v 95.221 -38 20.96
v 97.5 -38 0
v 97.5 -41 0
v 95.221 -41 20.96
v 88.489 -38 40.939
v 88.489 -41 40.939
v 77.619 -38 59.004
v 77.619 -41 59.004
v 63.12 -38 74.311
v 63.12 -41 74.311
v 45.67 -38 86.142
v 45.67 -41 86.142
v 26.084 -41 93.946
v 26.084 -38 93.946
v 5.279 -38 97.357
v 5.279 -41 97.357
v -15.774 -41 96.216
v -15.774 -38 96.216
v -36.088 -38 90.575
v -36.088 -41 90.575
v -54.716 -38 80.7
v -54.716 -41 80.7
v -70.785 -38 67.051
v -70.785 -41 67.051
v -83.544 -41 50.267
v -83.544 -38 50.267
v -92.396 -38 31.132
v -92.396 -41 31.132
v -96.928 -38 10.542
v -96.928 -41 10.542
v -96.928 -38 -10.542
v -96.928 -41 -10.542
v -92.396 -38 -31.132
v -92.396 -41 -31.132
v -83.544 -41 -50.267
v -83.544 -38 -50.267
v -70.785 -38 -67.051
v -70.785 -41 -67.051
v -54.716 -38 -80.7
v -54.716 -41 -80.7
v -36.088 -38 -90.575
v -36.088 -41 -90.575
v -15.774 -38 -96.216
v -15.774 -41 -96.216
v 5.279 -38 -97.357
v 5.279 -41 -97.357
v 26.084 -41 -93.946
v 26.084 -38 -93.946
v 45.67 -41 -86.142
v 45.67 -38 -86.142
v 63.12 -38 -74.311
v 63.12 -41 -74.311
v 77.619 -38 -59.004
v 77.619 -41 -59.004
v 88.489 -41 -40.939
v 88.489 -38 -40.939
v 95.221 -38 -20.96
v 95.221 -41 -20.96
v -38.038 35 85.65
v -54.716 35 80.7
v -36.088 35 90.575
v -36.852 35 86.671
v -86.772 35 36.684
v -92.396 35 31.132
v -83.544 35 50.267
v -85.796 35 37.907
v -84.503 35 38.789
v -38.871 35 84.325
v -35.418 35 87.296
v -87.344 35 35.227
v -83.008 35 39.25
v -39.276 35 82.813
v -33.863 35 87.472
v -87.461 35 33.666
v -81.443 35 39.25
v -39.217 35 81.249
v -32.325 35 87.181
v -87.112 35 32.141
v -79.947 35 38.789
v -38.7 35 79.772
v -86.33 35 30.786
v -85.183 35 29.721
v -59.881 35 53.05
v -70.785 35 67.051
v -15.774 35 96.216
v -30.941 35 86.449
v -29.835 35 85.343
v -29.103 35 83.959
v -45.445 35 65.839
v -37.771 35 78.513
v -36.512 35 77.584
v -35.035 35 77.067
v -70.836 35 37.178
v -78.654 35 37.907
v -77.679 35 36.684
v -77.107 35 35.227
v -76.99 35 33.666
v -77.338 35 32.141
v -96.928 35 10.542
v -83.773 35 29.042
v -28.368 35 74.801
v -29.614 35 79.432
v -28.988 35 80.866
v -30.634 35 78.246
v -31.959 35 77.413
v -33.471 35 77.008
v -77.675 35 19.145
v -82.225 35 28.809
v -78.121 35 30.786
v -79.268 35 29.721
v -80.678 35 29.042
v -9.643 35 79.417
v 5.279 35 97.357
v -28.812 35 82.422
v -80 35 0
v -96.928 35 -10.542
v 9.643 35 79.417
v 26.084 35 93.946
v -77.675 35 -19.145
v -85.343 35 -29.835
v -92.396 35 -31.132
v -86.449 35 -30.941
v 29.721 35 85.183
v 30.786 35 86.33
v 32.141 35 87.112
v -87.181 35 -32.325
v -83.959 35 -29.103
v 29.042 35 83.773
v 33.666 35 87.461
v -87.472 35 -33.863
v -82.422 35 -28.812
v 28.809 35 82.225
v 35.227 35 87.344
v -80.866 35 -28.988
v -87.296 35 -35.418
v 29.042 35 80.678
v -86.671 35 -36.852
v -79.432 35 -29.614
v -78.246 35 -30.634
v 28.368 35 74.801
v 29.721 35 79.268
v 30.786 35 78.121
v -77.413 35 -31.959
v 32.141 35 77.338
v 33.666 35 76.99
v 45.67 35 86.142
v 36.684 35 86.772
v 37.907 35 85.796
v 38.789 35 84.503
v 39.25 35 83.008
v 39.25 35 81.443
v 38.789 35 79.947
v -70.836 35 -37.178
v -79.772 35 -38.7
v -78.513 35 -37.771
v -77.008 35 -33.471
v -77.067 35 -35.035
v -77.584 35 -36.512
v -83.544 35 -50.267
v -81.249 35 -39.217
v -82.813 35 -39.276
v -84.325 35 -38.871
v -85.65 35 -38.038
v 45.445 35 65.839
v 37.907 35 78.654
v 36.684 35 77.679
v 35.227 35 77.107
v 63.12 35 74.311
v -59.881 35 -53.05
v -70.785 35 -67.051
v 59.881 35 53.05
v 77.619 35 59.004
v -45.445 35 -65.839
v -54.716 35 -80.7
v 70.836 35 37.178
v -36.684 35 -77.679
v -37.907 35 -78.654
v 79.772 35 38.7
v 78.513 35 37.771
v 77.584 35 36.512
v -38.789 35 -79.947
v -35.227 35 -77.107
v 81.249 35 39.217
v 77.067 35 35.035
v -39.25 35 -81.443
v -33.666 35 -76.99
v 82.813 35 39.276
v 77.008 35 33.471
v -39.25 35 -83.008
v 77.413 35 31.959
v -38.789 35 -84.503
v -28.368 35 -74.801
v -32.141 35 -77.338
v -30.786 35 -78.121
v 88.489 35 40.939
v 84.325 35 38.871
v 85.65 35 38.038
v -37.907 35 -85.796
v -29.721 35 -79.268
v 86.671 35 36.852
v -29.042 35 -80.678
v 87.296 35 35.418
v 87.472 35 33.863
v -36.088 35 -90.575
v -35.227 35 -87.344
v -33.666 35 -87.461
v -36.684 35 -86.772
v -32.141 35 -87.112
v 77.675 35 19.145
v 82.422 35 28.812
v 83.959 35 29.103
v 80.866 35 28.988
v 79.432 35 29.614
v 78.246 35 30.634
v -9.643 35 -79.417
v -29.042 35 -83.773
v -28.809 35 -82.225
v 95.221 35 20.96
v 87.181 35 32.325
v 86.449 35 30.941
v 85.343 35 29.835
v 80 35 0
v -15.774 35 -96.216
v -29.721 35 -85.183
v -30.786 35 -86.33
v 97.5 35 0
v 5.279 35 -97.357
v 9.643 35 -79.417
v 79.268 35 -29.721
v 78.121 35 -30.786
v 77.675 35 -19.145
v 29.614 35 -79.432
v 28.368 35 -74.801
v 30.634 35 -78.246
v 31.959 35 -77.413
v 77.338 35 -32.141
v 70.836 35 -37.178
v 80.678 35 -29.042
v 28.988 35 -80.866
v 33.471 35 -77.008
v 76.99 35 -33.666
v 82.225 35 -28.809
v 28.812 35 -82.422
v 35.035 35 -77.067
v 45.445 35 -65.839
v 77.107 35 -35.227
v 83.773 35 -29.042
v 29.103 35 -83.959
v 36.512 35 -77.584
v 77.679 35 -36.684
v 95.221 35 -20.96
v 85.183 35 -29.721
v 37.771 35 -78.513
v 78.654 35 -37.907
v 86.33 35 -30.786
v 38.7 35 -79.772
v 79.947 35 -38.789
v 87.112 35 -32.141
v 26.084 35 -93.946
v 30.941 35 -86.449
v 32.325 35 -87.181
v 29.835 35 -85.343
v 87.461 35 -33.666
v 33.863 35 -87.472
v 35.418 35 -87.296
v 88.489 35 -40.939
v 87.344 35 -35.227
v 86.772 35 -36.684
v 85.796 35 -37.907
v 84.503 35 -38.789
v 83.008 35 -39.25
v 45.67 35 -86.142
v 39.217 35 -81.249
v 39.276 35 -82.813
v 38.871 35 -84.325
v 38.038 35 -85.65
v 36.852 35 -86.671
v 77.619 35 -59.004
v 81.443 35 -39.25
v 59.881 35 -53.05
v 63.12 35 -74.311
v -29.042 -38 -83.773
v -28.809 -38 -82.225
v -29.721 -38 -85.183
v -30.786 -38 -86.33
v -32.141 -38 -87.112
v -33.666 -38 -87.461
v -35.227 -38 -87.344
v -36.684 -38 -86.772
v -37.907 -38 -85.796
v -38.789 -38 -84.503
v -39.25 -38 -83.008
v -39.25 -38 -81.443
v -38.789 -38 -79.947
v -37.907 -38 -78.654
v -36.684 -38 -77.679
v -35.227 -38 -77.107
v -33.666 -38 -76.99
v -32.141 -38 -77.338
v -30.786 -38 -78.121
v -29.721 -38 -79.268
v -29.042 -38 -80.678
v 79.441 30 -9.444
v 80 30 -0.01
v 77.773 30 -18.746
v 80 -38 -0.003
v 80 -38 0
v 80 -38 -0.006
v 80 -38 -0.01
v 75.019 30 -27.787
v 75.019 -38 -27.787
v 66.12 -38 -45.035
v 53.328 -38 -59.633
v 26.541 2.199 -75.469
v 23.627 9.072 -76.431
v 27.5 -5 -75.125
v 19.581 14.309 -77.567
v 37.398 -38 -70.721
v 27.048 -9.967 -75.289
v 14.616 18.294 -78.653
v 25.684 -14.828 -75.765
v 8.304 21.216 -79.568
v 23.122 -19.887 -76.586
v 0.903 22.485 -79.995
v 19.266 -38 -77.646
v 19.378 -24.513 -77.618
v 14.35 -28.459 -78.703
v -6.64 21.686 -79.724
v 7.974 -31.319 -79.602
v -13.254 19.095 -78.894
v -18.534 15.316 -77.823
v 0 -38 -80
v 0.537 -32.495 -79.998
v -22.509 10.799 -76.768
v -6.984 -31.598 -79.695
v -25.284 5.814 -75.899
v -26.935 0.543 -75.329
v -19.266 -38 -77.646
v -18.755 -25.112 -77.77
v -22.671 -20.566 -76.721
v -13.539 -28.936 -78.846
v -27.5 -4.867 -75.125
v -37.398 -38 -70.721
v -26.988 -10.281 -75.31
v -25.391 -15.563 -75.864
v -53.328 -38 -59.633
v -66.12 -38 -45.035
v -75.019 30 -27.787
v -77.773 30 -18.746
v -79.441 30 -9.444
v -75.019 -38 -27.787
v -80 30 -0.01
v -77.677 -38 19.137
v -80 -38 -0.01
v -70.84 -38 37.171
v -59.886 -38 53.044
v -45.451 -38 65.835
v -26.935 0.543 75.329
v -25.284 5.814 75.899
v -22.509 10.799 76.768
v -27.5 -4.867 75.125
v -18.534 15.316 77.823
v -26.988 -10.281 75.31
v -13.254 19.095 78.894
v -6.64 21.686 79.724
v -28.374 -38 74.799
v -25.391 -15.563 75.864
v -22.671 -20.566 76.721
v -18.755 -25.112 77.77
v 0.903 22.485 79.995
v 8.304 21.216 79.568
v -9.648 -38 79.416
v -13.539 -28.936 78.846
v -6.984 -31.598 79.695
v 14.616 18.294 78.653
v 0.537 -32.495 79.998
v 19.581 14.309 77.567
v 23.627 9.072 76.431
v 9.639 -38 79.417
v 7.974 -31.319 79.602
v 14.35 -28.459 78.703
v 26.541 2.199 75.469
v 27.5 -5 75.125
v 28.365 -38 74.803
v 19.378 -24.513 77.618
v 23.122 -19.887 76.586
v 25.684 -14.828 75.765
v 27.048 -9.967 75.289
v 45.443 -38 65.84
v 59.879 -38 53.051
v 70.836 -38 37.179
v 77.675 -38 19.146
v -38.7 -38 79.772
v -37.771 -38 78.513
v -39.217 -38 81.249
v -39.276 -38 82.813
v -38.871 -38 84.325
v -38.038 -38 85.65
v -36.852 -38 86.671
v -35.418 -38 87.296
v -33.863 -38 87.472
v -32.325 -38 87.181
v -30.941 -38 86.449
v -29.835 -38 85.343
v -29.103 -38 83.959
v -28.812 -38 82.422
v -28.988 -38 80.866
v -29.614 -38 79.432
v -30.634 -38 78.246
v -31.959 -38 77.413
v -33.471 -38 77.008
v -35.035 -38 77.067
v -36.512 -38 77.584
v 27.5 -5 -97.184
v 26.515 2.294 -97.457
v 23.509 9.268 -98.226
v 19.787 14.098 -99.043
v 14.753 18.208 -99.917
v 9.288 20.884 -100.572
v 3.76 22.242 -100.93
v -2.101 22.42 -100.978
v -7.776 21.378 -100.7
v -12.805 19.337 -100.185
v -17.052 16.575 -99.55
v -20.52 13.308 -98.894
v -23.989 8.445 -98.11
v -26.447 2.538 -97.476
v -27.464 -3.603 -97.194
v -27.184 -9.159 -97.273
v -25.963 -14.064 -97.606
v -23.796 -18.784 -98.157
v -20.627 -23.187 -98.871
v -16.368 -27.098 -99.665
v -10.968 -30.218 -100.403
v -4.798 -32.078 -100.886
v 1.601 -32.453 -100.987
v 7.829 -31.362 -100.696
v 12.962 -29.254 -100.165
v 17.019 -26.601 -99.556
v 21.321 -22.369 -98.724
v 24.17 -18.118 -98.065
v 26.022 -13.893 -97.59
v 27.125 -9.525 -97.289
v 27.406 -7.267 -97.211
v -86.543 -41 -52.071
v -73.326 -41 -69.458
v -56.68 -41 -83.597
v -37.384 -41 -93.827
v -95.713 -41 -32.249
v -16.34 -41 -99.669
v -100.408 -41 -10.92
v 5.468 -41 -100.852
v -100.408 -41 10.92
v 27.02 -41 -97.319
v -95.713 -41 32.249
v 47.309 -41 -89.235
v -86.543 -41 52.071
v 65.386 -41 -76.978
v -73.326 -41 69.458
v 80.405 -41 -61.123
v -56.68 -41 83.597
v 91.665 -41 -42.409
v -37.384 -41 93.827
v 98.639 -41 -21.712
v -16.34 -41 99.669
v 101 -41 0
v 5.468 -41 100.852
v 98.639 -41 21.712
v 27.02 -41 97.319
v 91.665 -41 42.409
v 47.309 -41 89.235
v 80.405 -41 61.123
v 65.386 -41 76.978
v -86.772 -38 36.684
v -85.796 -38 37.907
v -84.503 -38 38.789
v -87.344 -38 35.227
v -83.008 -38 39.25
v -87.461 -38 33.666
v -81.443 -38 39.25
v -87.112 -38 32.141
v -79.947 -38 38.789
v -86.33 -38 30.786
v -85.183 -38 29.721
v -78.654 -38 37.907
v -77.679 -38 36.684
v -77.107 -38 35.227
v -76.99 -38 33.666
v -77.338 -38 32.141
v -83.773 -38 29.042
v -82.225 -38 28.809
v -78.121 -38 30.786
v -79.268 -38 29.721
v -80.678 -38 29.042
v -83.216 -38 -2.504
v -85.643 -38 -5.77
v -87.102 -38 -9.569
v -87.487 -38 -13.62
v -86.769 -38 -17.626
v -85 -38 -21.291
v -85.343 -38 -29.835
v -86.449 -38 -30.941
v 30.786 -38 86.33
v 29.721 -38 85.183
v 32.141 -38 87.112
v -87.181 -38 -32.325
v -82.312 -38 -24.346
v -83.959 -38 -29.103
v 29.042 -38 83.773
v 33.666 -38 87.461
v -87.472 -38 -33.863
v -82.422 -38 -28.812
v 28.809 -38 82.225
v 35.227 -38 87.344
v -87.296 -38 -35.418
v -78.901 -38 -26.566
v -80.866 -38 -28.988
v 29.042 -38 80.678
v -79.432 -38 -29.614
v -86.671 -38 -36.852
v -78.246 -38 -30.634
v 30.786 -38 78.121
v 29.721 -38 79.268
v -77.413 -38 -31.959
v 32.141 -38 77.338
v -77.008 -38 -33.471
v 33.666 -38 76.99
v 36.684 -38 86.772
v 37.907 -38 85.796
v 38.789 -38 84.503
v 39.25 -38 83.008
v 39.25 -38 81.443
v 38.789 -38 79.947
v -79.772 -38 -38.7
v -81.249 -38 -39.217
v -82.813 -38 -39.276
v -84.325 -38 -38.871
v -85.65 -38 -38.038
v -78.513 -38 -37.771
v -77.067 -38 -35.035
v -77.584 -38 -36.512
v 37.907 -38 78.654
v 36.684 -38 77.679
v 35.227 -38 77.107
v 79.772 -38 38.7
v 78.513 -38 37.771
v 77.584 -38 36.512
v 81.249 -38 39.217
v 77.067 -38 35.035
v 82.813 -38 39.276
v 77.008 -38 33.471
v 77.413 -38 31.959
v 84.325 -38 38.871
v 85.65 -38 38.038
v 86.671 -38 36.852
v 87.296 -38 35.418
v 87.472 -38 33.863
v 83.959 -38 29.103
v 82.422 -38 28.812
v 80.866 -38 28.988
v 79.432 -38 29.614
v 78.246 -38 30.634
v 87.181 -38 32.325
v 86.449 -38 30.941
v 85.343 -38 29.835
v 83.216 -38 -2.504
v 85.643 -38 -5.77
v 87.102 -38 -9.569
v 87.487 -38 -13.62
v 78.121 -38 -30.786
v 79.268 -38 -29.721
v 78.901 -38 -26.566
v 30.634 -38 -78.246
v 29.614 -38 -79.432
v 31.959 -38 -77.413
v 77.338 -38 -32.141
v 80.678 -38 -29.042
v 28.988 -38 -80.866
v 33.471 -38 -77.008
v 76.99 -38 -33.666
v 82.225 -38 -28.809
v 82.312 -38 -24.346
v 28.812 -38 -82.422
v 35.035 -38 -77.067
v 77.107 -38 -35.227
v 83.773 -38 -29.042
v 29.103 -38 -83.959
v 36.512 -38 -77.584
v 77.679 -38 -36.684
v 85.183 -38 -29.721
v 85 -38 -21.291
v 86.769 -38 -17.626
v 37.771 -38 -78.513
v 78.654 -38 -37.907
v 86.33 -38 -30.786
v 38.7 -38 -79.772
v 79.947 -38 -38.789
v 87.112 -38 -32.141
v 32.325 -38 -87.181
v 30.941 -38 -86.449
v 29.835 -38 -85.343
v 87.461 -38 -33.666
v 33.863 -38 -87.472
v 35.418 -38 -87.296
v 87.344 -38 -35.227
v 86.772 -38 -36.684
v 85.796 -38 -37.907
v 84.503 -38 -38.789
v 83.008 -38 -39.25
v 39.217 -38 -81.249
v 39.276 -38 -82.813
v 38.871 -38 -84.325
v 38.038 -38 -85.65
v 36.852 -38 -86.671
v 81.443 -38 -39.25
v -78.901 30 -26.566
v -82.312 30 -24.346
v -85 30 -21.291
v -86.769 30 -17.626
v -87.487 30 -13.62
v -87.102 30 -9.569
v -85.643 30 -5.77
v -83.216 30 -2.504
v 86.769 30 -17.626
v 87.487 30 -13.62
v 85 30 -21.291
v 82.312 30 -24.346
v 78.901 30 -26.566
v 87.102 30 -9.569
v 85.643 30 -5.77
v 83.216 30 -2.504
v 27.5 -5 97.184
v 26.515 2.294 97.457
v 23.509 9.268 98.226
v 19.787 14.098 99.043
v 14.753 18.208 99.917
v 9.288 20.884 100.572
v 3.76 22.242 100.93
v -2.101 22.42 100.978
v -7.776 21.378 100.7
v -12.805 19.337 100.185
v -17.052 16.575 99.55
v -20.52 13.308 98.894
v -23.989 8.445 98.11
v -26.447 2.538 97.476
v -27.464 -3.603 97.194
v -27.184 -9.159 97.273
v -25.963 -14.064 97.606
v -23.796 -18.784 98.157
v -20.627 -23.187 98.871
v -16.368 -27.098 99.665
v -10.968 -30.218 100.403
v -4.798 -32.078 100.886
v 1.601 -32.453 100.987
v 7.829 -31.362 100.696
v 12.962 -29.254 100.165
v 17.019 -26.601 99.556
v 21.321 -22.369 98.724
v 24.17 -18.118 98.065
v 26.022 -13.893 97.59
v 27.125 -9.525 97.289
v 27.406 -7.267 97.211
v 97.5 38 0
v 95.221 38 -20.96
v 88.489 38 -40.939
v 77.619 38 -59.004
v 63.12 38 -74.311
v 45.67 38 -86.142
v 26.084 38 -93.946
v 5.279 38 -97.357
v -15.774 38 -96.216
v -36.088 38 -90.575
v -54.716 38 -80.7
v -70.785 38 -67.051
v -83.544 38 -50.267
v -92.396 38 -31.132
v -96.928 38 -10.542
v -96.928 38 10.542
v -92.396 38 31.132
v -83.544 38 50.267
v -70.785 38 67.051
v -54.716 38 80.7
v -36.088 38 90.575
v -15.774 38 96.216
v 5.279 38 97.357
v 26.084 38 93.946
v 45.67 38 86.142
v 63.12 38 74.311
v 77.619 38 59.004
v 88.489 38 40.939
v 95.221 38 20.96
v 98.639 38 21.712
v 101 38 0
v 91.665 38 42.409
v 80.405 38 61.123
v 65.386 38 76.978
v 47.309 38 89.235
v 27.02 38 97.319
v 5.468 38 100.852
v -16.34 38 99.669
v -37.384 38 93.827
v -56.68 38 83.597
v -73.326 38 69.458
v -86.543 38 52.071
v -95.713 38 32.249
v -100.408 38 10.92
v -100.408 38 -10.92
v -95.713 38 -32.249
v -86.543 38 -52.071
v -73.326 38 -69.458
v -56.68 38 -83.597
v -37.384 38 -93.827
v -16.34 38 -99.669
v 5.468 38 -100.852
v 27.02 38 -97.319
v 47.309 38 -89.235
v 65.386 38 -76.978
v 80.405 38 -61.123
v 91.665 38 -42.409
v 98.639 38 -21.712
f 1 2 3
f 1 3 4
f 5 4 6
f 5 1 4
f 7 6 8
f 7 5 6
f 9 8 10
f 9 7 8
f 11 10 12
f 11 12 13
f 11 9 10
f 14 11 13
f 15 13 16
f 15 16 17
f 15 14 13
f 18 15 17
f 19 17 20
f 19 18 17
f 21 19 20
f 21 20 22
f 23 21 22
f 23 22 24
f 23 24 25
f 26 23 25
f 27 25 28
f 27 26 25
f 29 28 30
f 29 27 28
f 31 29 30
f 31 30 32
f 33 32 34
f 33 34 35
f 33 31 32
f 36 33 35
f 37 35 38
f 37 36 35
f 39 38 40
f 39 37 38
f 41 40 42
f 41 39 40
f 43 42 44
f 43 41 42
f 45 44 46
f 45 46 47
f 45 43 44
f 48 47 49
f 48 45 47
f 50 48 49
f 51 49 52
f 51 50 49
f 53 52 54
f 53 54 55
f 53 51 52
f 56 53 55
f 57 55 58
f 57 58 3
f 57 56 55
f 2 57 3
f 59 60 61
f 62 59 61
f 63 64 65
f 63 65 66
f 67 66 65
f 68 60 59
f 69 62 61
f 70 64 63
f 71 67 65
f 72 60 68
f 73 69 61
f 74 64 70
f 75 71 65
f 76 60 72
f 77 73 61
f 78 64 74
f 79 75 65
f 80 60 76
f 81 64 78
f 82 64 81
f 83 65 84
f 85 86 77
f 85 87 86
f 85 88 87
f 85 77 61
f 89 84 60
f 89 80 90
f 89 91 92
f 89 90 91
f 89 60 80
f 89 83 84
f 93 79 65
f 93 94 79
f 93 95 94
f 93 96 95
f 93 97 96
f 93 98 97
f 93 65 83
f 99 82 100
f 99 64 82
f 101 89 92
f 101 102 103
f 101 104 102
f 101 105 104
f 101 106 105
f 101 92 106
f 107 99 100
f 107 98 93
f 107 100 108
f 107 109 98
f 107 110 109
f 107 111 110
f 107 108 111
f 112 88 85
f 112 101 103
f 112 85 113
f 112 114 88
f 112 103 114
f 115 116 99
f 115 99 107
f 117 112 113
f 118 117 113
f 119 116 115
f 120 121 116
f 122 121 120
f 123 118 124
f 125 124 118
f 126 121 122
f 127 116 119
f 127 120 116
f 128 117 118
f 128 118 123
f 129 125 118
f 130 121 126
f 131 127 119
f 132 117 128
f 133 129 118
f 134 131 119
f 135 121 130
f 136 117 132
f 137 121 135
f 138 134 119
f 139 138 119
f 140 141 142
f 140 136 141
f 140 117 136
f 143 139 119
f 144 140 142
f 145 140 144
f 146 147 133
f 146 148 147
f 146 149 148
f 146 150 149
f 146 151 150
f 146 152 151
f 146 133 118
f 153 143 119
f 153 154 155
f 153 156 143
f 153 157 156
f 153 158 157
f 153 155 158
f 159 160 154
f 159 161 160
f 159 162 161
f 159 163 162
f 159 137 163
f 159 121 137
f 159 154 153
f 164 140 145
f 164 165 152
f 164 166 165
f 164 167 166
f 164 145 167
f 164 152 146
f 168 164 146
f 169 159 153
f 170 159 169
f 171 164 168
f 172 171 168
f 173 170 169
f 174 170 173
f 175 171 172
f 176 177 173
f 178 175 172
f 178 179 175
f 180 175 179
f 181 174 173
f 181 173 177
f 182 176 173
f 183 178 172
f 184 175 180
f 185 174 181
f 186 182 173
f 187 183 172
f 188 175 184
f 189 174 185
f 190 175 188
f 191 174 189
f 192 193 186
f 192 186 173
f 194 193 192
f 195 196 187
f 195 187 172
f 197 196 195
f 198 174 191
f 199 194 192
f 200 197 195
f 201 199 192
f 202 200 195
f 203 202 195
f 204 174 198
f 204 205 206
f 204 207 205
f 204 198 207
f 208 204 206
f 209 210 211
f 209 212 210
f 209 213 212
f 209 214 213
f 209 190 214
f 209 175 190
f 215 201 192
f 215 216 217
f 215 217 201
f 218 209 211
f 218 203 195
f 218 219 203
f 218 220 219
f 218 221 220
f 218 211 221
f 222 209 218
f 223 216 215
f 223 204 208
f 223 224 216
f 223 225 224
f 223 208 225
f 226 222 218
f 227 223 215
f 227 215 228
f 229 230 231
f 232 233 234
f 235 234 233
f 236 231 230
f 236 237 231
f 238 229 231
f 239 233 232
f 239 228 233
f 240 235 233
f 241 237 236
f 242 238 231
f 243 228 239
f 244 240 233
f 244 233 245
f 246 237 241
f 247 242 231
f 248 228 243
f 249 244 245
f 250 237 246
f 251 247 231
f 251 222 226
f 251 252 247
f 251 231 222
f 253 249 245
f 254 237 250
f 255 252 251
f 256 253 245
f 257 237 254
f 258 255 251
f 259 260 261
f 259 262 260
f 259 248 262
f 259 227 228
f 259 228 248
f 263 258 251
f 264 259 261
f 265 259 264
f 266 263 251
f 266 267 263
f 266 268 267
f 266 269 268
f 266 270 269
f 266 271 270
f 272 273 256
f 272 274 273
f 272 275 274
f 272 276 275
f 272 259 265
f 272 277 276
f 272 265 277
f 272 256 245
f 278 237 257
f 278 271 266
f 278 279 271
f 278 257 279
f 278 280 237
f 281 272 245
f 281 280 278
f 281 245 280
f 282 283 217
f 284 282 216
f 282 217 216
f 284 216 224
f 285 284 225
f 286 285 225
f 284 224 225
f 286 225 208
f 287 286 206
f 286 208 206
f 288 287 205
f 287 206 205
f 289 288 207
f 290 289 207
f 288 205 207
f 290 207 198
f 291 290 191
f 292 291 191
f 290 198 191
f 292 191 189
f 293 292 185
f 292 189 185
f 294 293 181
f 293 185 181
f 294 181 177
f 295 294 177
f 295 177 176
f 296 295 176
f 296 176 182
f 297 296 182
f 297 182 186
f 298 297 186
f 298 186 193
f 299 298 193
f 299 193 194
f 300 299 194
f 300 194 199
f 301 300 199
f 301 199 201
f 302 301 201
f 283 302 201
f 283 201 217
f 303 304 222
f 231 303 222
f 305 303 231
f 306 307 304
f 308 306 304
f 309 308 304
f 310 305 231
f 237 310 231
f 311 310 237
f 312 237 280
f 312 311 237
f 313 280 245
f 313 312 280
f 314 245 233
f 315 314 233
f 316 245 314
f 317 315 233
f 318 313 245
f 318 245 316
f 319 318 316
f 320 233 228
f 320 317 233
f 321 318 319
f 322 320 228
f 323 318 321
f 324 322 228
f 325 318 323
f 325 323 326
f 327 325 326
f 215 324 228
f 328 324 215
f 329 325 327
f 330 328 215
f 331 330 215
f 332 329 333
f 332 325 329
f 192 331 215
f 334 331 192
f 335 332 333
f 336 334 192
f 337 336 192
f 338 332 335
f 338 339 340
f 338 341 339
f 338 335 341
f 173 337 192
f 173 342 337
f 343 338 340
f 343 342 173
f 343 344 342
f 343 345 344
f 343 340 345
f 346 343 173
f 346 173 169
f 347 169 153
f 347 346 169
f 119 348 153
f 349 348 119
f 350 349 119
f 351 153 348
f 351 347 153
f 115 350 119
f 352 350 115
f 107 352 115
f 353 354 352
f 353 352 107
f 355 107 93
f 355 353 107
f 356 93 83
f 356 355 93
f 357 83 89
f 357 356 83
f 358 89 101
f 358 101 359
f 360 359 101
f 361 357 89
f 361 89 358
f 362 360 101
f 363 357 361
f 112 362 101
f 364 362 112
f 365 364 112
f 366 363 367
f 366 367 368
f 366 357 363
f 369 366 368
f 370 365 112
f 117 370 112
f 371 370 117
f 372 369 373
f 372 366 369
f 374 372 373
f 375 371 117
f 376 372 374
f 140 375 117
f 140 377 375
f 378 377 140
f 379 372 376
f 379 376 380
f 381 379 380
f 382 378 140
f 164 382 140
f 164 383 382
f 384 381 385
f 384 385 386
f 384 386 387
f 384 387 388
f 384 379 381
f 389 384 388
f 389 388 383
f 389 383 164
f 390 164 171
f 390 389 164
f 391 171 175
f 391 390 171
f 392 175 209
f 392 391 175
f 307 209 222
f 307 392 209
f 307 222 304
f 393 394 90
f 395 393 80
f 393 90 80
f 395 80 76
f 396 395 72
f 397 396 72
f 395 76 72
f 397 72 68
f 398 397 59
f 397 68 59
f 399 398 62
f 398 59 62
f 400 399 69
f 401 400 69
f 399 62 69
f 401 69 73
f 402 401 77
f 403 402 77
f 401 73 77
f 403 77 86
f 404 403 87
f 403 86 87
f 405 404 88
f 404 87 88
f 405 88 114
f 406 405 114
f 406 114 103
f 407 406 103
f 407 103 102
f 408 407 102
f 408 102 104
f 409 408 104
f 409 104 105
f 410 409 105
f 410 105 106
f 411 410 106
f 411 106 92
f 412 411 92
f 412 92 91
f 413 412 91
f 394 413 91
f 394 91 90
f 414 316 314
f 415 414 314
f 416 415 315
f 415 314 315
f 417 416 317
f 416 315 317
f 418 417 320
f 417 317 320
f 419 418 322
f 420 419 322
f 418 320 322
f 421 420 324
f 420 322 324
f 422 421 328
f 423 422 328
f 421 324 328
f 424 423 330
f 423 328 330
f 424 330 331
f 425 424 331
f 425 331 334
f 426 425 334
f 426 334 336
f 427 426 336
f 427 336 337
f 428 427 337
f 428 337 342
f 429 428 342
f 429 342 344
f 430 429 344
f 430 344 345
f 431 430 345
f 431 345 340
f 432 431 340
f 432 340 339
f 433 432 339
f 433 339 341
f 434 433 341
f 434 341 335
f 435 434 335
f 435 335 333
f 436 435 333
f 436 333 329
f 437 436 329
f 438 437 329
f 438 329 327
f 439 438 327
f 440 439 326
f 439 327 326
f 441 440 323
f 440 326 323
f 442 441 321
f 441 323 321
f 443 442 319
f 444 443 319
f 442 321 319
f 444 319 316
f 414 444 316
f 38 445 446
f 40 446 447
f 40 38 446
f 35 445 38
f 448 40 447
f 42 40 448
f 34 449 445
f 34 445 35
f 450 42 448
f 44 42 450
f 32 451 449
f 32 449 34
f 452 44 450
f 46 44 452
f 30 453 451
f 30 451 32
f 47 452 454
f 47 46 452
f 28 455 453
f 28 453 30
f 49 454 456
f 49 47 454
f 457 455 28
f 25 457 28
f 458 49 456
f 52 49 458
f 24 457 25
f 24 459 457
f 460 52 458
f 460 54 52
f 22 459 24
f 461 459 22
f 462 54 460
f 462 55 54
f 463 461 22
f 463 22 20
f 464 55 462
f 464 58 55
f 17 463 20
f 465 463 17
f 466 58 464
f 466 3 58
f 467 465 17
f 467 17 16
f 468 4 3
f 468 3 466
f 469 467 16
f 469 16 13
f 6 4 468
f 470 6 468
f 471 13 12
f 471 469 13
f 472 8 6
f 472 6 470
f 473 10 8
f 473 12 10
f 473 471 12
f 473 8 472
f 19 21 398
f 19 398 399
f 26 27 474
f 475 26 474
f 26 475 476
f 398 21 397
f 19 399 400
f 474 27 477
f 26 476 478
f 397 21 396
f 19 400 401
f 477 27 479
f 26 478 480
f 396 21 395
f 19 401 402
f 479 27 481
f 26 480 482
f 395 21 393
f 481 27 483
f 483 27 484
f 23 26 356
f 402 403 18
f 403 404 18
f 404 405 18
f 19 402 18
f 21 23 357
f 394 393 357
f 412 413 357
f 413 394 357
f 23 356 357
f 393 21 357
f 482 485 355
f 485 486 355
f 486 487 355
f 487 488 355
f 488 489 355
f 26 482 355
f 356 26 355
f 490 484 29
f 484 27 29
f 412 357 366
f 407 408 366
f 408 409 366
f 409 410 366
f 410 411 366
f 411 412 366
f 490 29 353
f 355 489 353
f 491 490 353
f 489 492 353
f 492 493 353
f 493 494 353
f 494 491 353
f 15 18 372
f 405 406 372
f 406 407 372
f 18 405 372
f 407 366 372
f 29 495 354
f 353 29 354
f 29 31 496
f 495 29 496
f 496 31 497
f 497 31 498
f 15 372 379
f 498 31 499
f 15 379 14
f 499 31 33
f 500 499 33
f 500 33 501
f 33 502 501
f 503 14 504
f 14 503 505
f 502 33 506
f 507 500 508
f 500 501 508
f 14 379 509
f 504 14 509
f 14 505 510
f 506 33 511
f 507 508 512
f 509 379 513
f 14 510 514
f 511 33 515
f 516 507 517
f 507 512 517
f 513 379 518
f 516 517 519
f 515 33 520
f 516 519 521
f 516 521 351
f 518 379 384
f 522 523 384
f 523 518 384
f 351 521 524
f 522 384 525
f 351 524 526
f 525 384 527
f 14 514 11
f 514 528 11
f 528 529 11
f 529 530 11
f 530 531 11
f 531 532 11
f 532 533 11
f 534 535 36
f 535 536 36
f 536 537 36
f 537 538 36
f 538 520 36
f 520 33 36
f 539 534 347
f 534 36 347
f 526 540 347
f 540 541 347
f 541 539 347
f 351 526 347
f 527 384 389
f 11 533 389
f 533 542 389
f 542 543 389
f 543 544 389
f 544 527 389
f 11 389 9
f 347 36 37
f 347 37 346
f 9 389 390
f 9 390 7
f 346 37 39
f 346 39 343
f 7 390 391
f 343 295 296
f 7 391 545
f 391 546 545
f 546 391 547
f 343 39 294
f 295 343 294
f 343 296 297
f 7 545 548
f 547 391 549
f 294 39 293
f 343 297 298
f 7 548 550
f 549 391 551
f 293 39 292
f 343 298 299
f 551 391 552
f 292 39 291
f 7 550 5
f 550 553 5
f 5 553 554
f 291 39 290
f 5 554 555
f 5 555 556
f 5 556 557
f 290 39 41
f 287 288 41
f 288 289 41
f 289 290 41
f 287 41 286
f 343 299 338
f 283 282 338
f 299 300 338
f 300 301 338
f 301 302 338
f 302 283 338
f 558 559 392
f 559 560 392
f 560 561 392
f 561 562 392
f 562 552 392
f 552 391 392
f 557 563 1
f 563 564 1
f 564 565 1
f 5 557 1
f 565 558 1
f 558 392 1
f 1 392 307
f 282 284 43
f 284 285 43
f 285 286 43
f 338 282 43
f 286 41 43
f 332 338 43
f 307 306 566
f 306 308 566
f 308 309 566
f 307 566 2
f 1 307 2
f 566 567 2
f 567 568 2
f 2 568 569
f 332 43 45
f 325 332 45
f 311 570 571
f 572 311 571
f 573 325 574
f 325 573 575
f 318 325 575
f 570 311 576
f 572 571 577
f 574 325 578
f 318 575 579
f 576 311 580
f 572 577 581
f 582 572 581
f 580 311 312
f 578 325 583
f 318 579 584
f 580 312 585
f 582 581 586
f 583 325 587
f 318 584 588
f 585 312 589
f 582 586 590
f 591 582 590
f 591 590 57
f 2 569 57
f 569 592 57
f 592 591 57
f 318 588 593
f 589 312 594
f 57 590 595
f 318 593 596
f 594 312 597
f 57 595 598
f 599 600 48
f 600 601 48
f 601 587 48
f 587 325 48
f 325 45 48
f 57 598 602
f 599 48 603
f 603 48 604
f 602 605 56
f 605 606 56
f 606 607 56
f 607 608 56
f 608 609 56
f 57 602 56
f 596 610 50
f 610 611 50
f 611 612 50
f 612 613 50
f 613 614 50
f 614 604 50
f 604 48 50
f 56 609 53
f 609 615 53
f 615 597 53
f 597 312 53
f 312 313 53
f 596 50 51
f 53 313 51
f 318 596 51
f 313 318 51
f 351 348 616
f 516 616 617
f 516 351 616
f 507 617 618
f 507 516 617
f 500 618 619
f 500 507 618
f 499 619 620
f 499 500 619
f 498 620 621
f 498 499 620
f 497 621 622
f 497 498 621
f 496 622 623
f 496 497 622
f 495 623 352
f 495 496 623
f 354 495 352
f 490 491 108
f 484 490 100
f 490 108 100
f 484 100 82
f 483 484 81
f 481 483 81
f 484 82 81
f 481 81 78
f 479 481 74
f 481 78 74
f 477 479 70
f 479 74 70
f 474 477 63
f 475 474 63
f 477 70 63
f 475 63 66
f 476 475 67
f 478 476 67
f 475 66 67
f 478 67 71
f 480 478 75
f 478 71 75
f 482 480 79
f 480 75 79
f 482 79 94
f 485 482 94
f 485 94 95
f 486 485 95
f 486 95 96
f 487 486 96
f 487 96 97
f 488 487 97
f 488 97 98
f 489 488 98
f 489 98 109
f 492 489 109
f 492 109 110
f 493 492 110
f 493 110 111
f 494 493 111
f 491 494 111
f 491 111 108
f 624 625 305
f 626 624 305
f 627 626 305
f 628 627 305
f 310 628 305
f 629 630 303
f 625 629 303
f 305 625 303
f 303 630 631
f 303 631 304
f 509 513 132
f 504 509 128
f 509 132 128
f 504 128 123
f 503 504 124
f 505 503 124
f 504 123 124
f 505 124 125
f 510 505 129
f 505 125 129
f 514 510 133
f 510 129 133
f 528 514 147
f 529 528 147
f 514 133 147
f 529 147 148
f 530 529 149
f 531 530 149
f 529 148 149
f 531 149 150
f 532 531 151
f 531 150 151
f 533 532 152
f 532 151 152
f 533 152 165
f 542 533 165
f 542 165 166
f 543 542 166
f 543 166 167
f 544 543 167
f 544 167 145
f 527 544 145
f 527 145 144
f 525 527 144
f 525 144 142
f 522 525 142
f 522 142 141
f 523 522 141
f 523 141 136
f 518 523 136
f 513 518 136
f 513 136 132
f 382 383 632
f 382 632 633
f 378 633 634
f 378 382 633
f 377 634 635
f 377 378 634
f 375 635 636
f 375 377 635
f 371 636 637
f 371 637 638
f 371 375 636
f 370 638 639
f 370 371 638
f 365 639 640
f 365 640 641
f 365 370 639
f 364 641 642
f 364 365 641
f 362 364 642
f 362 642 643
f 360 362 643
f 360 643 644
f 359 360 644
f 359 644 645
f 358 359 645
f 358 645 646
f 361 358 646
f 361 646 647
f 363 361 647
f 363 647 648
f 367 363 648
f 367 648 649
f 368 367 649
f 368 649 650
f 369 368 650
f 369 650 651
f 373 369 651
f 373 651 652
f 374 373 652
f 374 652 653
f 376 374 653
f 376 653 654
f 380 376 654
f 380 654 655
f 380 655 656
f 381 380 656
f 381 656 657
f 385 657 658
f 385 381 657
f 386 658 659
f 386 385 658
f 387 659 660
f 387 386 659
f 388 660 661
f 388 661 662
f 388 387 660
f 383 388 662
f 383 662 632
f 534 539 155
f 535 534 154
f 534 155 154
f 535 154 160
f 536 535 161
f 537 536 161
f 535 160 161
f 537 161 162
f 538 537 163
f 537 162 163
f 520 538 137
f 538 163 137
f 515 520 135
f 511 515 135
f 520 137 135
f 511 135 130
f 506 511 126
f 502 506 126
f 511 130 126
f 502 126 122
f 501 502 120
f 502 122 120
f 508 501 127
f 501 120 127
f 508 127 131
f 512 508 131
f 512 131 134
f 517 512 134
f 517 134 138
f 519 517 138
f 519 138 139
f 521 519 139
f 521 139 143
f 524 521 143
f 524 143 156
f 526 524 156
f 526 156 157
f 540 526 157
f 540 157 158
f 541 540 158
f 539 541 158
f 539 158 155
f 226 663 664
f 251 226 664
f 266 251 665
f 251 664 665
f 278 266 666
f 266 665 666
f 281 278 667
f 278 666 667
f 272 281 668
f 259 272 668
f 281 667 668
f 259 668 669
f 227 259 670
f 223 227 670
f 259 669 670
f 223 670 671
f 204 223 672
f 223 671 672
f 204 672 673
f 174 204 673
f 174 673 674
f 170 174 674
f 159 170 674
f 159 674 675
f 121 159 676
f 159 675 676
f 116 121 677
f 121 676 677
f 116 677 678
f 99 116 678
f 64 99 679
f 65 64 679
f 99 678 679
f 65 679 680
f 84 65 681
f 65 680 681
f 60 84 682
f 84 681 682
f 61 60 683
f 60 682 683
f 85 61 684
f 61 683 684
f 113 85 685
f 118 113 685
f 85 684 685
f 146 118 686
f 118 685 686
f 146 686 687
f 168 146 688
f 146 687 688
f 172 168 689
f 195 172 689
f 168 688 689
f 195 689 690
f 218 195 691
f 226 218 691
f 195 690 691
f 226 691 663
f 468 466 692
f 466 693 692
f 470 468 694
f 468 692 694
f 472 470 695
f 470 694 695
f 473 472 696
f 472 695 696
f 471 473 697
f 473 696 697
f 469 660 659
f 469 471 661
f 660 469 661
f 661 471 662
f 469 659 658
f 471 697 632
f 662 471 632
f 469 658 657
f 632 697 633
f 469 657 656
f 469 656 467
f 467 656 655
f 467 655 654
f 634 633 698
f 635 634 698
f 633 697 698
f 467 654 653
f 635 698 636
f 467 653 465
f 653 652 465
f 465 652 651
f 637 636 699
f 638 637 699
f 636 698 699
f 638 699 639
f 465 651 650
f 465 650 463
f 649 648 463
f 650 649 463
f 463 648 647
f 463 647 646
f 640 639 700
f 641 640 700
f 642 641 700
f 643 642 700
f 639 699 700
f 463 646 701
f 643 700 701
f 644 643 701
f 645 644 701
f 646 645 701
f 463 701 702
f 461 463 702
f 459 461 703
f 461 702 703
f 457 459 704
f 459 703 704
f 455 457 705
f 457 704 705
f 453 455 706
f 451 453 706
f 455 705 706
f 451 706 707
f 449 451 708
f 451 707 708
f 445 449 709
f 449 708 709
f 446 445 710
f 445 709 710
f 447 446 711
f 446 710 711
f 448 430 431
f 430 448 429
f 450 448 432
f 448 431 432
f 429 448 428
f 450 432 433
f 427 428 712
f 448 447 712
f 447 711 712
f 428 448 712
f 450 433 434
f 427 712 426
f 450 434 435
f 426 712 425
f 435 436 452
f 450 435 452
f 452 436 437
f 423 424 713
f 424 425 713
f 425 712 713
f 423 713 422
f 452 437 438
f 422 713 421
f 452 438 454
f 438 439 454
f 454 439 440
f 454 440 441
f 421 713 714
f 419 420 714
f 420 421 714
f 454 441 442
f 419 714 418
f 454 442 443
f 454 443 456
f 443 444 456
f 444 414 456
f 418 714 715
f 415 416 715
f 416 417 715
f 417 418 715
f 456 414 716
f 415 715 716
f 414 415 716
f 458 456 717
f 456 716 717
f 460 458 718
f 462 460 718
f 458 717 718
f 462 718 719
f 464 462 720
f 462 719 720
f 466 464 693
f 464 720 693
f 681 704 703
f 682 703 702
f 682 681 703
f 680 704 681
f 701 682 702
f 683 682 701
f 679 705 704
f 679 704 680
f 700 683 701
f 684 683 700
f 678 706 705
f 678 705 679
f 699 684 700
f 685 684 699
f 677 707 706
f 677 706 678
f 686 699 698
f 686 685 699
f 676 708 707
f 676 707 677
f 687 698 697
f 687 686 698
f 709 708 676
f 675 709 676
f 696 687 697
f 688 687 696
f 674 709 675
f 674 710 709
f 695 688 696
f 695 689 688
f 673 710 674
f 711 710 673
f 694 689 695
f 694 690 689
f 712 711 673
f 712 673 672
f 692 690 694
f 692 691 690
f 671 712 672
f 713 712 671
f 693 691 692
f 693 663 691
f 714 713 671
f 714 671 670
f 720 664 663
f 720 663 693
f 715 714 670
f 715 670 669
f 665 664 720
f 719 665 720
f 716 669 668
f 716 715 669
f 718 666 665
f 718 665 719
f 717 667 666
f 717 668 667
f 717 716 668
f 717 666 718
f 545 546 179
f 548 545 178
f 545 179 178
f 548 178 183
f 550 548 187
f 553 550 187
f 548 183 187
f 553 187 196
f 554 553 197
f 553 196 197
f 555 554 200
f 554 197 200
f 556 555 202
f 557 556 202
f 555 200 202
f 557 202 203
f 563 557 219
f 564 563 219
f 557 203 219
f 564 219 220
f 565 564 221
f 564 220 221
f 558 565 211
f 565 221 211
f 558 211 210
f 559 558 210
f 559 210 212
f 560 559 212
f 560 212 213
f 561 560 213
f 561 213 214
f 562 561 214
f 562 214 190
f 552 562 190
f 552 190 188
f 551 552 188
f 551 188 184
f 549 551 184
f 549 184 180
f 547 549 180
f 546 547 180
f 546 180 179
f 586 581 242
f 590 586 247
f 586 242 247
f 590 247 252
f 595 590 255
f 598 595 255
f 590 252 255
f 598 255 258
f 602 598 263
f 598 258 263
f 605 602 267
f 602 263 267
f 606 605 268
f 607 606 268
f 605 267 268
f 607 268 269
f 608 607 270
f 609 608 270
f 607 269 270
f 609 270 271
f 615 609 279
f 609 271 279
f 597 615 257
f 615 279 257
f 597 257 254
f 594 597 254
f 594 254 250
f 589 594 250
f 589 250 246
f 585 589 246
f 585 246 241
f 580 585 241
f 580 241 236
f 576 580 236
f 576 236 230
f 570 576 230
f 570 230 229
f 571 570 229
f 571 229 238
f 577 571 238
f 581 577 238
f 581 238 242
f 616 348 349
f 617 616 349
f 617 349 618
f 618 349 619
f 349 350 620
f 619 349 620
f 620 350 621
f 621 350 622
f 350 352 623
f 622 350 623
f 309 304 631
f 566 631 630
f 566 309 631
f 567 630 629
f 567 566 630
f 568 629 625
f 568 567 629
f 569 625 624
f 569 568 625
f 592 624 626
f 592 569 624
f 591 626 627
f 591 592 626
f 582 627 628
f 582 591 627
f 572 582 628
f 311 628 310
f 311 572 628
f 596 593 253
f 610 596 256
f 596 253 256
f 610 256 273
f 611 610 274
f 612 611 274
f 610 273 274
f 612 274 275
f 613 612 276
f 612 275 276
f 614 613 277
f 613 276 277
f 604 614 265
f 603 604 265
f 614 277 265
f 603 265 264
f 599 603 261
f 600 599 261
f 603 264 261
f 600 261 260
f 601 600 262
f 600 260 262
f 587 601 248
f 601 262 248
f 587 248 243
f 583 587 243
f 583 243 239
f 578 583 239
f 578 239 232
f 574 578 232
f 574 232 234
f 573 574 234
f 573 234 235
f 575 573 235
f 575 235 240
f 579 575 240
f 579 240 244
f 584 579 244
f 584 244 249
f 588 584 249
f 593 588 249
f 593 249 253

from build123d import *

# Parameters (mm, degrees)
SKETCH1_R               = 101
SKETCH1_R_2             = 80
BOSS_EXTRUDE1_DEPTH     = 38
SKETCH3_R               = 27.5
CUT_EXTRUDE1_DEPTH      = 102
CUT_EXTRUDE1_DEPTH_BACK = 102
SKETCH4_R               = 5.25
CUT_EXTRUDE2_DEPTH      = 76
CIRPATTERN1_COUNT       = 8
CUT_EXTRUDE3_DEPTH      = 68
SKETCH6_R               = 101
SKETCH6_R_2             = 97.5
BOSS_EXTRUDE2_DEPTH     = 3
SKETCH7_R               = 97.5
CUT_EXTRUDE4_DEPTH      = 3


with BuildPart() as part:
    # Sketch1 → Boss-Extrude1 (new body, symmetric)
    with BuildSketch(Plane(origin=(0, 0, 0), x_dir=(1, 0, 0), z_dir=(0, 1, 0))):
        Circle(SKETCH1_R)
        Circle(SKETCH1_R_2, mode=Mode.SUBTRACT)
    extrude(amount=BOSS_EXTRUDE1_DEPTH, both=True)

    # Sketch3 → Cut-Extrude1 (cut, two sides)
    with BuildSketch(Plane.XY) as cut_extrude1_sk:
        with Locations((0, -5)):
            Circle(SKETCH3_R)
    extrude(amount=CUT_EXTRUDE1_DEPTH, mode=Mode.SUBTRACT)
    extrude(cut_extrude1_sk.sketch, amount=-CUT_EXTRUDE1_DEPTH_BACK, mode=Mode.SUBTRACT)

    # Sketch4 → Cut-Extrude2 (cut)
    with BuildSketch(Plane(origin=(0, 38, 0), x_dir=(1, 0, 0), z_dir=(0, 1, 0))):
        with Locations((-34.05882548, 82.225278394)):
            Circle(SKETCH4_R)
    cut_extrude2 = extrude(amount=-CUT_EXTRUDE2_DEPTH, mode=Mode.SUBTRACT)

    # CirPattern1: Cut-Extrude2 ×8 about axis
    cirpattern1_axis = Axis((0, 0, 0), (0, 1, 0))
    for i in range(1, CIRPATTERN1_COUNT):
        add(cut_extrude2.rotate(cirpattern1_axis, i * 360 / CIRPATTERN1_COUNT), mode=Mode.SUBTRACT)

    # Sketch5 → Cut-Extrude3 (cut)
    with BuildSketch(Plane.XZ.offset(38)):
        with BuildLine():
            Line((-72.5, 2), (72.5, 2))
            ThreePointArc((72.5, 2), (87.5, -13), (72.5, -28))
            Line((72.5, -28), (-72.5, -28))
            ThreePointArc((-72.5, -28), (-87.5, -13), (-72.5, 2))
        make_face()
    extrude(amount=-CUT_EXTRUDE3_DEPTH, mode=Mode.SUBTRACT)

    # Sketch6 → Boss-Extrude2 (add)
    with BuildSketch(Plane.XZ.offset(38)):
        Circle(SKETCH6_R)
        Circle(SKETCH6_R_2, mode=Mode.SUBTRACT)
    extrude(amount=BOSS_EXTRUDE2_DEPTH)

    # Sketch7 → Cut-Extrude4 (cut)
    with BuildSketch(Plane(origin=(0, 38, 0), x_dir=(1, 0, 0), z_dir=(0, 1, 0))):
        Circle(SKETCH7_R)
    extrude(amount=-CUT_EXTRUDE4_DEPTH, mode=Mode.SUBTRACT)


solid = part.part
